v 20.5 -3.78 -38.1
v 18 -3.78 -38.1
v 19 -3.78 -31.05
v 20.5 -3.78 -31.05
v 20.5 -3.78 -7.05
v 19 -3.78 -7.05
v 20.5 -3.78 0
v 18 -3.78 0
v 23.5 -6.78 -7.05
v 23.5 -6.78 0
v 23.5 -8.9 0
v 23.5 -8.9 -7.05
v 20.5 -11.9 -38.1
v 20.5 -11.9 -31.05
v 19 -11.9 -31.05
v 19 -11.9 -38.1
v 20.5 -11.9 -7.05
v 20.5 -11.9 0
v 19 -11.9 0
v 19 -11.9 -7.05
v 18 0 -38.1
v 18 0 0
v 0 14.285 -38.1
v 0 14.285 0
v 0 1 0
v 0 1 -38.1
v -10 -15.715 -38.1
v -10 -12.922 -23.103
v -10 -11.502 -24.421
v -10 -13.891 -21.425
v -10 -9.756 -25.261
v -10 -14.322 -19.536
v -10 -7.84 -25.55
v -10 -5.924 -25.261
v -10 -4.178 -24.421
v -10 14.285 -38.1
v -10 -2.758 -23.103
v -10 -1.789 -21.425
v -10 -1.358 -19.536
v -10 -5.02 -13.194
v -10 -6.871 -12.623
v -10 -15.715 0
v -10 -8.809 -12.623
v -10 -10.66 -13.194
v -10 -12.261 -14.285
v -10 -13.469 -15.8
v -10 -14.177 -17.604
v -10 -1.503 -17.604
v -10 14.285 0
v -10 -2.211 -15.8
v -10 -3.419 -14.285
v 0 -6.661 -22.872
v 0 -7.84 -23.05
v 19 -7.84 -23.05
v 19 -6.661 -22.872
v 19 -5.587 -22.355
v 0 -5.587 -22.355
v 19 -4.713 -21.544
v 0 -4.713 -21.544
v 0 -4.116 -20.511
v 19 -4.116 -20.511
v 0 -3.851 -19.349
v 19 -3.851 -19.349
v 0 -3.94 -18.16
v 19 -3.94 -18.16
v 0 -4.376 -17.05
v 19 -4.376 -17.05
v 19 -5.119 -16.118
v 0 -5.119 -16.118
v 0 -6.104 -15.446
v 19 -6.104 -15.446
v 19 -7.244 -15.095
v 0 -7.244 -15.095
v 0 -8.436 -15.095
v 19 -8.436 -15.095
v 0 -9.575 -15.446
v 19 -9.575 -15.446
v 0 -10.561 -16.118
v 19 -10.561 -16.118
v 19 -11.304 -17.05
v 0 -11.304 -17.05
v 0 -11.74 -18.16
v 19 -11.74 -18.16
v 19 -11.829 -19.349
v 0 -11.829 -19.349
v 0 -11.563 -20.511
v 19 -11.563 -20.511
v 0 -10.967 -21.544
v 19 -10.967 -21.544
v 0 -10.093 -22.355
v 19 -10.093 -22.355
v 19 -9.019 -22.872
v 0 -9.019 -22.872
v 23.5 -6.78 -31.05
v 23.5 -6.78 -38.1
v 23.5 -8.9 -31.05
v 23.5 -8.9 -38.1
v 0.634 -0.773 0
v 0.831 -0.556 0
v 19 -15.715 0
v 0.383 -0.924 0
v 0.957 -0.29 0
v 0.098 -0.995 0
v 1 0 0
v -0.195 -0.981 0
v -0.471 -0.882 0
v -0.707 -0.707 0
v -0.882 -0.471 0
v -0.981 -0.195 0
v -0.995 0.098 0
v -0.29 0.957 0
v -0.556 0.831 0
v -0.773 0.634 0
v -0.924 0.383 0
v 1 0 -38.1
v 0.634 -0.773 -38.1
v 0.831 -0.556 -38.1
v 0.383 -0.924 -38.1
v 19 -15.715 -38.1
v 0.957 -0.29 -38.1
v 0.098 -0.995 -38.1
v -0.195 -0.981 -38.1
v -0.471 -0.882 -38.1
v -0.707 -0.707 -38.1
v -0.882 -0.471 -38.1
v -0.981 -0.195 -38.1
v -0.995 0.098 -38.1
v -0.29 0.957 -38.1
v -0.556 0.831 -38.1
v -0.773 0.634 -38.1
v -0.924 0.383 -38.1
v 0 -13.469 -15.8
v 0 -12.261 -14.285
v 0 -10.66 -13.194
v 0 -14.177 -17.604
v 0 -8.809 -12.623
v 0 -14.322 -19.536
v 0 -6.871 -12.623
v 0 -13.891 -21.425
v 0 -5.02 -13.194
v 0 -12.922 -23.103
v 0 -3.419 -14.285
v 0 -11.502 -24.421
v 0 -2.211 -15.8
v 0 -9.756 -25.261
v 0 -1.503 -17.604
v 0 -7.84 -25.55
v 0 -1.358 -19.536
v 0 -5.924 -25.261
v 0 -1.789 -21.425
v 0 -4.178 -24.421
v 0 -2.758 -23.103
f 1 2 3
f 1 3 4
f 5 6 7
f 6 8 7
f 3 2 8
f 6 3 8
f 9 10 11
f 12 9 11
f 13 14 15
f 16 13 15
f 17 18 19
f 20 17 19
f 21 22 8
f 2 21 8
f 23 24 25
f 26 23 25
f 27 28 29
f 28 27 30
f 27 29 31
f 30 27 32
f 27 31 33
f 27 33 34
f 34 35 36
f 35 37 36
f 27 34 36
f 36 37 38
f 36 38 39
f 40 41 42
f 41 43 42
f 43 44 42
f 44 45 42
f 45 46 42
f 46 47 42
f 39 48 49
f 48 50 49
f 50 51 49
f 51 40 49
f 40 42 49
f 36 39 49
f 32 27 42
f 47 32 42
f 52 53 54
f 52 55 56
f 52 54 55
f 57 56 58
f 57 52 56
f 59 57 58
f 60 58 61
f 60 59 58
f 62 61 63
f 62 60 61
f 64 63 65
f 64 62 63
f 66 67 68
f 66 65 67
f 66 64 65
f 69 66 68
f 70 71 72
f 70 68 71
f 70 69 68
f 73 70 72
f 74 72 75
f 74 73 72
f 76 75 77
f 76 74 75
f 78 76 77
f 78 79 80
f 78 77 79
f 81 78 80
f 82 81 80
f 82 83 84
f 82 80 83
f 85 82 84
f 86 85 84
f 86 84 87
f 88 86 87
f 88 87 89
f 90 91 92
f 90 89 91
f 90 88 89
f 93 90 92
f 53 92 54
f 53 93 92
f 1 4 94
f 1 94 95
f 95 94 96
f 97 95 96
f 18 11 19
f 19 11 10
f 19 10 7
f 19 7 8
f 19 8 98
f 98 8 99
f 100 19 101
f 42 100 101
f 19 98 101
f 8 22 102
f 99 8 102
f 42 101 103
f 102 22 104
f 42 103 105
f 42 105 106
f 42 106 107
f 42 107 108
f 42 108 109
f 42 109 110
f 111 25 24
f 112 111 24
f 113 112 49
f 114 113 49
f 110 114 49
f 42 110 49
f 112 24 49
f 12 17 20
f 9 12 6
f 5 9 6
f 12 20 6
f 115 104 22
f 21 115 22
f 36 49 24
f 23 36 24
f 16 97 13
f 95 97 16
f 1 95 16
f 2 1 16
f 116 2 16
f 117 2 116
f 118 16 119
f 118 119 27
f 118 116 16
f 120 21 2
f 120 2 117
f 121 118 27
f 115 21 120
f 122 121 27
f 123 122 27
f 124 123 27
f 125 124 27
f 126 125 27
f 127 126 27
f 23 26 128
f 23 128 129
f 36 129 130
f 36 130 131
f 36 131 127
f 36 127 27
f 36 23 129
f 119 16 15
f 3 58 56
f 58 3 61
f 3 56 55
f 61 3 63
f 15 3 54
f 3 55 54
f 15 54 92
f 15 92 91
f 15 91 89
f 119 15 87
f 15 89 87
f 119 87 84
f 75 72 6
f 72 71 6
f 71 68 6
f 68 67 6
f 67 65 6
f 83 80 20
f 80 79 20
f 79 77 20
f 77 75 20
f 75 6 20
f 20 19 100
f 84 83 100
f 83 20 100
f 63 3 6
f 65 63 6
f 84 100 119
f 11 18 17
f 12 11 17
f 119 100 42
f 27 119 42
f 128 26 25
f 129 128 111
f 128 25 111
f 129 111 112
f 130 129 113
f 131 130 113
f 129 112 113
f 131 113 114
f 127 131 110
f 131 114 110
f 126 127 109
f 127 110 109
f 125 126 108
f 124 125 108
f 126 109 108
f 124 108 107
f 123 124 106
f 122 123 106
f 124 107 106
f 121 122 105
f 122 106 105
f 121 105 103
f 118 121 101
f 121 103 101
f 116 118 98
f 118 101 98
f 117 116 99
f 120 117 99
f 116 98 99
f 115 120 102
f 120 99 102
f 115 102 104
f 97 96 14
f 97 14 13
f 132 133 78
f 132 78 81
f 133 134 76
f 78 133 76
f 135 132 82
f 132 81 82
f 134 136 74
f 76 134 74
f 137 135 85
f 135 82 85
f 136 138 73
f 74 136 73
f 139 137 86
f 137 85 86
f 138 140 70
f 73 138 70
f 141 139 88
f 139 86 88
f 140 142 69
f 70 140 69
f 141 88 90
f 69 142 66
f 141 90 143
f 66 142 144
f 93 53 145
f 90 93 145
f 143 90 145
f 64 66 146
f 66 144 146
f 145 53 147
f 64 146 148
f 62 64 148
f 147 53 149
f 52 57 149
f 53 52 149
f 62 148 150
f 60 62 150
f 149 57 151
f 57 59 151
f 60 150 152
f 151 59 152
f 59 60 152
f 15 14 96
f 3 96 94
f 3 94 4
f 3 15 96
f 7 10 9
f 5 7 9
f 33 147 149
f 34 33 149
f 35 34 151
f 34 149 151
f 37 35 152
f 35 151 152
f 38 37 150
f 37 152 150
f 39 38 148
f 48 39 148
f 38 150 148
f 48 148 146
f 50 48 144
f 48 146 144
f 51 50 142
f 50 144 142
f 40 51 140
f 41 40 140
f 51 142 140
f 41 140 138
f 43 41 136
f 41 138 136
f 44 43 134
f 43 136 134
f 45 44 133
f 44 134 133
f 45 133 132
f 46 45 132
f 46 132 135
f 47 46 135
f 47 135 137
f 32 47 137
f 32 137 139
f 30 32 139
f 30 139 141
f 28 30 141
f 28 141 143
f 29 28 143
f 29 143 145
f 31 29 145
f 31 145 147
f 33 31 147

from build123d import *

# Parameters (mm, degrees)
BOSS_EXTRUDE1_DEPTH     = 38.1
CUT_EXTRUDE1_DEPTH      = 55.4
CUT_EXTRUDE1_DEPTH_BACK = 30
SKETCH2_R               = 4
SKETCH3_R               = 6.5
CUT_EXTRUDE2_DEPTH      = 18.2
CUT_EXTRUDE3_START      = 19
SKETCH4_W               = 24
SKETCH4_H               = 20
CUT_EXTRUDE3_DEPTH      = 10
CHAMFER1_SIZE           = 3


with BuildPart() as part:
    # Sketch1 → Boss-Extrude1 (new body)
    with BuildSketch(Plane.XY):
        with BuildLine():
            Line((-10, -15.714961024), (-10, 14.285038976))
            Line((-10, 14.285038976), (0, 14.285038976))
            Line((0, 14.285038976), (0, 1))
            ThreePointArc((0, 1), (-0.707106781, -0.707106781), (1, 0))
            Line((1, 0), (18, 0))
            Line((18, 0), (18, -3.779961024))
            Line((18, -3.779961024), (23.5, -3.779961024))
            Line((23.5, -3.779961024), (23.5, -11.899961024))
            Line((23.5, -11.899961024), (19, -11.899961024))
            Line((19, -11.899961024), (19, -15.714961024))
            Line((19, -15.714961024), (-10, -15.714961024))
        make_face()
    extrude(amount=-BOSS_EXTRUDE1_DEPTH)

    # Sketch2 → Cut-Extrude1 (cut, two sides: drawn at the far end of the back side and taken through both)
    with BuildSketch(Plane(origin=(0, 0, 0), x_dir=(0, 0, -1), z_dir=(1, 0, 0)).offset(-CUT_EXTRUDE1_DEPTH_BACK)):
        with Locations((-19.05, -7.839961024)):
            Circle(SKETCH2_R)
        with Locations((19.05, -7.839961024)):
            Circle(SKETCH2_R)
    extrude(amount=CUT_EXTRUDE1_DEPTH + CUT_EXTRUDE1_DEPTH_BACK, mode=Mode.SUBTRACT)

    # Sketch3 → Cut-Extrude2 (cut)
    with BuildSketch(Plane(origin=(0, 0, 0), x_dir=(0, 0, -1), z_dir=(1, 0, 0))):
        with Locations((19.05, -7.839961024)):
            Circle(SKETCH3_R)
    extrude(amount=-CUT_EXTRUDE2_DEPTH, mode=Mode.SUBTRACT)

    # Sketch4 → Cut-Extrude3 (cut)
    with BuildSketch(Plane(origin=(0, 0, 0), x_dir=(0, 0, -1), z_dir=(1, 0, 0)).offset(CUT_EXTRUDE3_START)):
        with Locations((19.05, -7.839961024)):
            Rectangle(SKETCH4_W, SKETCH4_H)
    extrude(amount=CUT_EXTRUDE3_DEPTH, mode=Mode.SUBTRACT)

    # Chamfer1
    chamfer1_edges = [part.edges().sort_by_distance(p)[0] for p in [
        (23.5, -3.779961024, -34.575),
        (23.5, -11.899961024, -34.575),
        (23.5, -11.899961024, -3.525),
        (23.5, -3.779961024, -3.525),
    ]]
    chamfer(chamfer1_edges, length=CHAMFER1_SIZE)


solid = part.part
